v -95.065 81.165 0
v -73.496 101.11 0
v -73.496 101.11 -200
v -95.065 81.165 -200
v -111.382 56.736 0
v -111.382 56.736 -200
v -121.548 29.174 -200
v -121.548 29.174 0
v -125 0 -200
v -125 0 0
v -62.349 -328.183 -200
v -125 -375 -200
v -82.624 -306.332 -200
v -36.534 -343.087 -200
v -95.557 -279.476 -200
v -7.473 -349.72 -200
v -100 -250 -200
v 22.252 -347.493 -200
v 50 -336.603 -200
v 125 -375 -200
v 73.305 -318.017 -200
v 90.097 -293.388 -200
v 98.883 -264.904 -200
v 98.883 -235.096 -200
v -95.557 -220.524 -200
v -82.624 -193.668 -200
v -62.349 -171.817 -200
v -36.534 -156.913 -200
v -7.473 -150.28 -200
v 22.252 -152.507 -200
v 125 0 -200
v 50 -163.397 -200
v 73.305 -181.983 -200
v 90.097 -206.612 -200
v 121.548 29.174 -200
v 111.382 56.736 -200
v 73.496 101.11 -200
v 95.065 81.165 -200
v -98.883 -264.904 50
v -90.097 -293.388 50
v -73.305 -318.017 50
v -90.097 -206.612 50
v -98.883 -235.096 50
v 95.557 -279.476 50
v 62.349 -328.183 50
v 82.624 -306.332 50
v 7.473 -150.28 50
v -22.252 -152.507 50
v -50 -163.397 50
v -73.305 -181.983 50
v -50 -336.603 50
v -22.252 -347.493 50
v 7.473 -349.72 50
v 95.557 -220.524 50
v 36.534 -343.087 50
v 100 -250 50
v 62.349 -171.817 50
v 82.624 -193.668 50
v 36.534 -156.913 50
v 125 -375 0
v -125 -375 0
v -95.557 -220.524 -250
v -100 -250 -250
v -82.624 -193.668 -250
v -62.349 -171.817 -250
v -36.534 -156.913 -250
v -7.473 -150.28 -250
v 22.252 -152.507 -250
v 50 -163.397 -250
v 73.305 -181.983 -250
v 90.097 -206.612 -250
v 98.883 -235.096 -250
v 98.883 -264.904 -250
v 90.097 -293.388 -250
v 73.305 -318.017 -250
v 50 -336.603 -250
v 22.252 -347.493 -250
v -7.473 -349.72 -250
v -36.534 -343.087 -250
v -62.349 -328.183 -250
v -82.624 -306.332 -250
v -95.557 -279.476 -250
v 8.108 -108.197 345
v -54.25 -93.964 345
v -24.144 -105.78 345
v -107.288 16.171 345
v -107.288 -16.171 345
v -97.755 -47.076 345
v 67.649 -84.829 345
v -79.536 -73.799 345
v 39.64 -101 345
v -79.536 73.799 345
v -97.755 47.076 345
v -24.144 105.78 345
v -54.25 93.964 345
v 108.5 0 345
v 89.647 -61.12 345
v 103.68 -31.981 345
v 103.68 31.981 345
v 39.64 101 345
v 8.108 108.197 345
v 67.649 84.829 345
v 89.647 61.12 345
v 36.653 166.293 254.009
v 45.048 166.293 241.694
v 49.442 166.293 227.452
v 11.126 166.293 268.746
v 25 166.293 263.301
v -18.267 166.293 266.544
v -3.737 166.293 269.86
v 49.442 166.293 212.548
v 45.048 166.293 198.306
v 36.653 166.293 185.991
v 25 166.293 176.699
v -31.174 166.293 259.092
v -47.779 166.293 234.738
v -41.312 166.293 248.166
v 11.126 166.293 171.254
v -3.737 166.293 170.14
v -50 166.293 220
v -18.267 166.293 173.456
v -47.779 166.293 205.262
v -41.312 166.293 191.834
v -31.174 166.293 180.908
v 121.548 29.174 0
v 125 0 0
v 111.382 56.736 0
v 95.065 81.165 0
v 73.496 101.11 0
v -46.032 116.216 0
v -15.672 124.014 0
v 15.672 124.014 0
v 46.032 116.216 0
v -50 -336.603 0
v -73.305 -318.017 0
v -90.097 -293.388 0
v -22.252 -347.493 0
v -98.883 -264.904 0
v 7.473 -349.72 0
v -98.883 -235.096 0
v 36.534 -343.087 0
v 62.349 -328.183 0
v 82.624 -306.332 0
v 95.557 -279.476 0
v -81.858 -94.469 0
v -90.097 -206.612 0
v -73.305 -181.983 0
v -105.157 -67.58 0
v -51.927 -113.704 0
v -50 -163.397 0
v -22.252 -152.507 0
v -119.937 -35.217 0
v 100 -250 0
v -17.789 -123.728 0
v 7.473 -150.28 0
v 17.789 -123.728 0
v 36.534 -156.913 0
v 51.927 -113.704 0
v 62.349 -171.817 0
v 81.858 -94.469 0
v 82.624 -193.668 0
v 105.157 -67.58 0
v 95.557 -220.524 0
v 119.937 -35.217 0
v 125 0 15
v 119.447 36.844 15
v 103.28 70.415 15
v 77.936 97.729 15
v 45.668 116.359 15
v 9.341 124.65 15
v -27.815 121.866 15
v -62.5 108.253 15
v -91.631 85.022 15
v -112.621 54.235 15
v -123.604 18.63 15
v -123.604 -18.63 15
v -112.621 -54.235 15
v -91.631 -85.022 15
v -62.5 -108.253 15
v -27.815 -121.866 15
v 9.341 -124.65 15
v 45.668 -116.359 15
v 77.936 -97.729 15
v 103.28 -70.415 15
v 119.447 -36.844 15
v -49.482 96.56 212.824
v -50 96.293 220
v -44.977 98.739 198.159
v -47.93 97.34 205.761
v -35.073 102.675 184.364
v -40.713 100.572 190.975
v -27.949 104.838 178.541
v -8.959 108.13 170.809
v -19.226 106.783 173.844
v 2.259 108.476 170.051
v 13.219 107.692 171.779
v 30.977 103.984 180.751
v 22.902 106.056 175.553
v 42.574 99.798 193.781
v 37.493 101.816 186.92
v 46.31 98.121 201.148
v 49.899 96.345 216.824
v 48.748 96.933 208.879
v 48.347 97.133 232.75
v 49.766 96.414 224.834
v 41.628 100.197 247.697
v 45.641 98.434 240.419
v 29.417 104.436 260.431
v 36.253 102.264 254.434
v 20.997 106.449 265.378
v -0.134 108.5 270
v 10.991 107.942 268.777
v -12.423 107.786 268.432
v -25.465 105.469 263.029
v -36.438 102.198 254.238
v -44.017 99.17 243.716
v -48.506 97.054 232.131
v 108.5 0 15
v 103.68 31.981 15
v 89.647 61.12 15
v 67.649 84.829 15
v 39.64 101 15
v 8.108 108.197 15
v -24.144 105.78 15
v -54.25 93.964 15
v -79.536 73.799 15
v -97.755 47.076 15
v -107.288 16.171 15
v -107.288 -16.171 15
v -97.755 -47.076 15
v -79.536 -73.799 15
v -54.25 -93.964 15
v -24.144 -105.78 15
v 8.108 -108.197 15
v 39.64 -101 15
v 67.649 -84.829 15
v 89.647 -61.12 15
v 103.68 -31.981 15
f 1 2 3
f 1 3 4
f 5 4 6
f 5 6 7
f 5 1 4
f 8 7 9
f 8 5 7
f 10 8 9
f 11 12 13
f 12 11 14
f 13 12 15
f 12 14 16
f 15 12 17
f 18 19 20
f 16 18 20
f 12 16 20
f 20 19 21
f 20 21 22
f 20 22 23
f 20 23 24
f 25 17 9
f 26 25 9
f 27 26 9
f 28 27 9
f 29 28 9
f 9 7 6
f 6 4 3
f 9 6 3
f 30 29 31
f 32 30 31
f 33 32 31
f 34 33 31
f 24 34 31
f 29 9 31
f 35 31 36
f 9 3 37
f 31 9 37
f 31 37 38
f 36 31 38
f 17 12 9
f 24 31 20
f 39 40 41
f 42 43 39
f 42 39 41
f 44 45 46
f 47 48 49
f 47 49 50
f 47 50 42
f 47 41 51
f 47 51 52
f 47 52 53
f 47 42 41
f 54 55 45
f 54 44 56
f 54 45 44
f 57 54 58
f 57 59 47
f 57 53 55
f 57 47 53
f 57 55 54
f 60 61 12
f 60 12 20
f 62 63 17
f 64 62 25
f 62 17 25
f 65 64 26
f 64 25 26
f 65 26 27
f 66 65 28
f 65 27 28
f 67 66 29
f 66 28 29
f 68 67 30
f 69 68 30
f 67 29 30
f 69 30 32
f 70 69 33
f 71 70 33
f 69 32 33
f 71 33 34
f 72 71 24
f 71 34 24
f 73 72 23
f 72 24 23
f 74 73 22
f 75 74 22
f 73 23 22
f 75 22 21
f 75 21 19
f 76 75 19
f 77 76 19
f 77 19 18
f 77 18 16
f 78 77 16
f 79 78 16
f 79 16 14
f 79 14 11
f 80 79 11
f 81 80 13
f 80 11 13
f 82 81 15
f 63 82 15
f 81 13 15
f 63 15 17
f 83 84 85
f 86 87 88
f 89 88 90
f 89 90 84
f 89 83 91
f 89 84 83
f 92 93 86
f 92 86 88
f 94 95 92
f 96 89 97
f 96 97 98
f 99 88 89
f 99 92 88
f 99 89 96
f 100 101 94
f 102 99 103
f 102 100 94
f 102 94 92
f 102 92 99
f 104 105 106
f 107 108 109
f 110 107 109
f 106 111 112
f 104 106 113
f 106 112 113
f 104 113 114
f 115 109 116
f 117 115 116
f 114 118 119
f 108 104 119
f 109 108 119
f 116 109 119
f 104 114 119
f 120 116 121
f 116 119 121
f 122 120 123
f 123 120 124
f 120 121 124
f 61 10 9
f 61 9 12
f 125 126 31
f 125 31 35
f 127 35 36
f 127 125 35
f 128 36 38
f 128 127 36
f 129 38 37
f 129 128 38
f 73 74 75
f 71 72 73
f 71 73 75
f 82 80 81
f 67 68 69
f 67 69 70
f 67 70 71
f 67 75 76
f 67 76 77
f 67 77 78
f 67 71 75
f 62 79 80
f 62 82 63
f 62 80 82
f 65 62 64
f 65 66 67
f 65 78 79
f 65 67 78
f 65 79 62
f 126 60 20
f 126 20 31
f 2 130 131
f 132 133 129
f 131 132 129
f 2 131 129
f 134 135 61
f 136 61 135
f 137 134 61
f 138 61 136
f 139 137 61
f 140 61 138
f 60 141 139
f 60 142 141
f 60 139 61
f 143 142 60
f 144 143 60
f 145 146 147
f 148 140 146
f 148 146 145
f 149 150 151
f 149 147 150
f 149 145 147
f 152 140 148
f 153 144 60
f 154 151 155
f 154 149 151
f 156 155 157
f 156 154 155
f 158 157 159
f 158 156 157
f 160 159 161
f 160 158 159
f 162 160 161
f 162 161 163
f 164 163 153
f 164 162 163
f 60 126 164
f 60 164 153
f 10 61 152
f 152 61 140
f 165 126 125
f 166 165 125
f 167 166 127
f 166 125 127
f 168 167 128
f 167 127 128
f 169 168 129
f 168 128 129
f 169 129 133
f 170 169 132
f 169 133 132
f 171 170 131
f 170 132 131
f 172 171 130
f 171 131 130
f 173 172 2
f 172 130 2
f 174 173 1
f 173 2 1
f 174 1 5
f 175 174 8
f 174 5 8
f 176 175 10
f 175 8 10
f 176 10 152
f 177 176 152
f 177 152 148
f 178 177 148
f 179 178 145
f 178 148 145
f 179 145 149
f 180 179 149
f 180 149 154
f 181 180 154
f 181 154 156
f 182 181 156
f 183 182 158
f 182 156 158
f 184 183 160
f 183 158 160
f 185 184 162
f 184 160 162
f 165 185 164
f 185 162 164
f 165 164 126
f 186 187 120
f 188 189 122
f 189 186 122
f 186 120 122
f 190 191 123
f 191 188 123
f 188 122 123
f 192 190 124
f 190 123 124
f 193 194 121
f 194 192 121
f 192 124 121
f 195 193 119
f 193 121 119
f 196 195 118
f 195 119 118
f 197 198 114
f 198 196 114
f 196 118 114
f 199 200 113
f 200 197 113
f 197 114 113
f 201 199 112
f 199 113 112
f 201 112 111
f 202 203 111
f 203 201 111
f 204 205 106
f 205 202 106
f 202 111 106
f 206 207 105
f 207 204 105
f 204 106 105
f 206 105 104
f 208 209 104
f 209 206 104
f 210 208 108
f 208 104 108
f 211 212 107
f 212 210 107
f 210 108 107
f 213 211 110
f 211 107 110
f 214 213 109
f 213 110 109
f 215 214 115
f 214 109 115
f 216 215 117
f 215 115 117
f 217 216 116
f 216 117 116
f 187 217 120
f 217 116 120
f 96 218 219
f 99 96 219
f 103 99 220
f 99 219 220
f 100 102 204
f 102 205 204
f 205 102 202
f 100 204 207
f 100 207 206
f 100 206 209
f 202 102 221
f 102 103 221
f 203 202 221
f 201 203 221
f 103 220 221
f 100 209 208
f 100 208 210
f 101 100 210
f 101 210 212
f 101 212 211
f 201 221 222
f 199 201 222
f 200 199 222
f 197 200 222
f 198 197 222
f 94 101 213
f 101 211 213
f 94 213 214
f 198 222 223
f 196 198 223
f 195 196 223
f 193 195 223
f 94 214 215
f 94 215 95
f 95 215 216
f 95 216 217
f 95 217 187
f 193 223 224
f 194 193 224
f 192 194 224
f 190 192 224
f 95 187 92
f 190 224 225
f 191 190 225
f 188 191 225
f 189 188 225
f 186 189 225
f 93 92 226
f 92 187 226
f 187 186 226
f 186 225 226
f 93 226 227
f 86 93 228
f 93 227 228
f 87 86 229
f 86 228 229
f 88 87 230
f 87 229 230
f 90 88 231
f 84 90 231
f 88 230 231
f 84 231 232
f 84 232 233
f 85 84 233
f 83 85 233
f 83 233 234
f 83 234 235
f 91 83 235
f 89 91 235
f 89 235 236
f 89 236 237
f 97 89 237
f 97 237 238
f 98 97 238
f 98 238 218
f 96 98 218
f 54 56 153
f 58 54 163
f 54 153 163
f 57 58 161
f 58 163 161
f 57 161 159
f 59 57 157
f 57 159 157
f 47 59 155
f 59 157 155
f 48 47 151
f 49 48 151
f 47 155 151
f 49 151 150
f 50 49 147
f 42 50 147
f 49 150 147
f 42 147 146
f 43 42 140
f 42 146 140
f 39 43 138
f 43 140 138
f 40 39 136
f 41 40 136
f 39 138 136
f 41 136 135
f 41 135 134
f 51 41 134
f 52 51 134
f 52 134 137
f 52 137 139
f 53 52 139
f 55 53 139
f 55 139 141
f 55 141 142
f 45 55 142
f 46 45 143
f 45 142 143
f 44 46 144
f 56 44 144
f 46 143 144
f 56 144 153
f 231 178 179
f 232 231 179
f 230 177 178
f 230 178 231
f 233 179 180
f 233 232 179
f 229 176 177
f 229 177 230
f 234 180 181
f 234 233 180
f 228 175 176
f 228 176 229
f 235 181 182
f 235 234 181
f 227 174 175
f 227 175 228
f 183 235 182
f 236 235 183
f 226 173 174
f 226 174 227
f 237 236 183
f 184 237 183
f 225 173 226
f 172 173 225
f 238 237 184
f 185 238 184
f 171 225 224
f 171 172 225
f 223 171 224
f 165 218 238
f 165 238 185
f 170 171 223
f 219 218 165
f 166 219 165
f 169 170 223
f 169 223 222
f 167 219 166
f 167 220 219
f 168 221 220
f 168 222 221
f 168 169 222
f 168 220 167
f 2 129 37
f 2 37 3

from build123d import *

# Parameters (mm, degrees)
SKETCH_1_R      = 125
EXTRUDE_1_DEPTH = 15
SKETCH_2_R      = 108.5
EXTRUDE_2_DEPTH = 330
SKETCH_4_W      = 50
SKETCH_4_H      = 70
EXTRUDE_4_DEPTH = 200
SKETCH_6_R      = 100
EXTRUDE_5_DEPTH = 50
SKETCH_7_R      = 100
EXTRUDE_6_DEPTH = 50


with BuildPart() as part:
    # 草图1 → 凸台-拉伸1 (new body)
    with BuildSketch(Plane.XY):
        Circle(SKETCH_1_R)
    extrude(amount=EXTRUDE_1_DEPTH)

    # 草图2 → 凸台-拉伸2 (add)
    with BuildSketch(Plane.XY.offset(15)):
        Circle(SKETCH_2_R)
    extrude(amount=EXTRUDE_2_DEPTH)

    # 草图4 → 旋转1 (revolve)
    with BuildSketch(Plane.XY.offset(220)):
        with Locations((-25, 131.292523074)):
            Rectangle(SKETCH_4_W, SKETCH_4_H)
    revolve(axis=Axis((0, 165.766992941, 220), (0, -1, 0)))

    # 草图5 → 凸台-拉伸4 (add)
    with BuildSketch(Plane(origin=(0, 0, 0), x_dir=(-1, 0, 0), z_dir=(0, 0, -1))):
        with BuildLine():
            Line((-73.496377584, 101.110249144), (73.496377584, 101.110249144))
            ThreePointArc((73.496377584, 101.110249144), (111.382330731, 56.736023838), (125, 0))
            Line((125, 0), (125, -375))
            Line((125, -375), (-125, -375))
            Line((-125, -375), (-125, 0))
            ThreePointArc((-125, 0), (-111.382330731, 56.736023838), (-73.496377584, 101.110249144))
        make_face()
    extrude(amount=EXTRUDE_4_DEPTH)

    # 草图6 → 凸台-拉伸5 (add)
    with BuildSketch(Plane(origin=(0, 0, -200), x_dir=(-1, 0, 0), z_dir=(0, 0, -1))):
        with Locations((0, -250)):
            Circle(SKETCH_6_R)
    extrude(amount=EXTRUDE_5_DEPTH)

    # 草图7 → 凸台-拉伸6 (add)
    with BuildSketch(Plane.XY):
        with Locations((0, -250)):
            Circle(SKETCH_7_R)
    extrude(amount=EXTRUDE_6_DEPTH)


solid = part.part
